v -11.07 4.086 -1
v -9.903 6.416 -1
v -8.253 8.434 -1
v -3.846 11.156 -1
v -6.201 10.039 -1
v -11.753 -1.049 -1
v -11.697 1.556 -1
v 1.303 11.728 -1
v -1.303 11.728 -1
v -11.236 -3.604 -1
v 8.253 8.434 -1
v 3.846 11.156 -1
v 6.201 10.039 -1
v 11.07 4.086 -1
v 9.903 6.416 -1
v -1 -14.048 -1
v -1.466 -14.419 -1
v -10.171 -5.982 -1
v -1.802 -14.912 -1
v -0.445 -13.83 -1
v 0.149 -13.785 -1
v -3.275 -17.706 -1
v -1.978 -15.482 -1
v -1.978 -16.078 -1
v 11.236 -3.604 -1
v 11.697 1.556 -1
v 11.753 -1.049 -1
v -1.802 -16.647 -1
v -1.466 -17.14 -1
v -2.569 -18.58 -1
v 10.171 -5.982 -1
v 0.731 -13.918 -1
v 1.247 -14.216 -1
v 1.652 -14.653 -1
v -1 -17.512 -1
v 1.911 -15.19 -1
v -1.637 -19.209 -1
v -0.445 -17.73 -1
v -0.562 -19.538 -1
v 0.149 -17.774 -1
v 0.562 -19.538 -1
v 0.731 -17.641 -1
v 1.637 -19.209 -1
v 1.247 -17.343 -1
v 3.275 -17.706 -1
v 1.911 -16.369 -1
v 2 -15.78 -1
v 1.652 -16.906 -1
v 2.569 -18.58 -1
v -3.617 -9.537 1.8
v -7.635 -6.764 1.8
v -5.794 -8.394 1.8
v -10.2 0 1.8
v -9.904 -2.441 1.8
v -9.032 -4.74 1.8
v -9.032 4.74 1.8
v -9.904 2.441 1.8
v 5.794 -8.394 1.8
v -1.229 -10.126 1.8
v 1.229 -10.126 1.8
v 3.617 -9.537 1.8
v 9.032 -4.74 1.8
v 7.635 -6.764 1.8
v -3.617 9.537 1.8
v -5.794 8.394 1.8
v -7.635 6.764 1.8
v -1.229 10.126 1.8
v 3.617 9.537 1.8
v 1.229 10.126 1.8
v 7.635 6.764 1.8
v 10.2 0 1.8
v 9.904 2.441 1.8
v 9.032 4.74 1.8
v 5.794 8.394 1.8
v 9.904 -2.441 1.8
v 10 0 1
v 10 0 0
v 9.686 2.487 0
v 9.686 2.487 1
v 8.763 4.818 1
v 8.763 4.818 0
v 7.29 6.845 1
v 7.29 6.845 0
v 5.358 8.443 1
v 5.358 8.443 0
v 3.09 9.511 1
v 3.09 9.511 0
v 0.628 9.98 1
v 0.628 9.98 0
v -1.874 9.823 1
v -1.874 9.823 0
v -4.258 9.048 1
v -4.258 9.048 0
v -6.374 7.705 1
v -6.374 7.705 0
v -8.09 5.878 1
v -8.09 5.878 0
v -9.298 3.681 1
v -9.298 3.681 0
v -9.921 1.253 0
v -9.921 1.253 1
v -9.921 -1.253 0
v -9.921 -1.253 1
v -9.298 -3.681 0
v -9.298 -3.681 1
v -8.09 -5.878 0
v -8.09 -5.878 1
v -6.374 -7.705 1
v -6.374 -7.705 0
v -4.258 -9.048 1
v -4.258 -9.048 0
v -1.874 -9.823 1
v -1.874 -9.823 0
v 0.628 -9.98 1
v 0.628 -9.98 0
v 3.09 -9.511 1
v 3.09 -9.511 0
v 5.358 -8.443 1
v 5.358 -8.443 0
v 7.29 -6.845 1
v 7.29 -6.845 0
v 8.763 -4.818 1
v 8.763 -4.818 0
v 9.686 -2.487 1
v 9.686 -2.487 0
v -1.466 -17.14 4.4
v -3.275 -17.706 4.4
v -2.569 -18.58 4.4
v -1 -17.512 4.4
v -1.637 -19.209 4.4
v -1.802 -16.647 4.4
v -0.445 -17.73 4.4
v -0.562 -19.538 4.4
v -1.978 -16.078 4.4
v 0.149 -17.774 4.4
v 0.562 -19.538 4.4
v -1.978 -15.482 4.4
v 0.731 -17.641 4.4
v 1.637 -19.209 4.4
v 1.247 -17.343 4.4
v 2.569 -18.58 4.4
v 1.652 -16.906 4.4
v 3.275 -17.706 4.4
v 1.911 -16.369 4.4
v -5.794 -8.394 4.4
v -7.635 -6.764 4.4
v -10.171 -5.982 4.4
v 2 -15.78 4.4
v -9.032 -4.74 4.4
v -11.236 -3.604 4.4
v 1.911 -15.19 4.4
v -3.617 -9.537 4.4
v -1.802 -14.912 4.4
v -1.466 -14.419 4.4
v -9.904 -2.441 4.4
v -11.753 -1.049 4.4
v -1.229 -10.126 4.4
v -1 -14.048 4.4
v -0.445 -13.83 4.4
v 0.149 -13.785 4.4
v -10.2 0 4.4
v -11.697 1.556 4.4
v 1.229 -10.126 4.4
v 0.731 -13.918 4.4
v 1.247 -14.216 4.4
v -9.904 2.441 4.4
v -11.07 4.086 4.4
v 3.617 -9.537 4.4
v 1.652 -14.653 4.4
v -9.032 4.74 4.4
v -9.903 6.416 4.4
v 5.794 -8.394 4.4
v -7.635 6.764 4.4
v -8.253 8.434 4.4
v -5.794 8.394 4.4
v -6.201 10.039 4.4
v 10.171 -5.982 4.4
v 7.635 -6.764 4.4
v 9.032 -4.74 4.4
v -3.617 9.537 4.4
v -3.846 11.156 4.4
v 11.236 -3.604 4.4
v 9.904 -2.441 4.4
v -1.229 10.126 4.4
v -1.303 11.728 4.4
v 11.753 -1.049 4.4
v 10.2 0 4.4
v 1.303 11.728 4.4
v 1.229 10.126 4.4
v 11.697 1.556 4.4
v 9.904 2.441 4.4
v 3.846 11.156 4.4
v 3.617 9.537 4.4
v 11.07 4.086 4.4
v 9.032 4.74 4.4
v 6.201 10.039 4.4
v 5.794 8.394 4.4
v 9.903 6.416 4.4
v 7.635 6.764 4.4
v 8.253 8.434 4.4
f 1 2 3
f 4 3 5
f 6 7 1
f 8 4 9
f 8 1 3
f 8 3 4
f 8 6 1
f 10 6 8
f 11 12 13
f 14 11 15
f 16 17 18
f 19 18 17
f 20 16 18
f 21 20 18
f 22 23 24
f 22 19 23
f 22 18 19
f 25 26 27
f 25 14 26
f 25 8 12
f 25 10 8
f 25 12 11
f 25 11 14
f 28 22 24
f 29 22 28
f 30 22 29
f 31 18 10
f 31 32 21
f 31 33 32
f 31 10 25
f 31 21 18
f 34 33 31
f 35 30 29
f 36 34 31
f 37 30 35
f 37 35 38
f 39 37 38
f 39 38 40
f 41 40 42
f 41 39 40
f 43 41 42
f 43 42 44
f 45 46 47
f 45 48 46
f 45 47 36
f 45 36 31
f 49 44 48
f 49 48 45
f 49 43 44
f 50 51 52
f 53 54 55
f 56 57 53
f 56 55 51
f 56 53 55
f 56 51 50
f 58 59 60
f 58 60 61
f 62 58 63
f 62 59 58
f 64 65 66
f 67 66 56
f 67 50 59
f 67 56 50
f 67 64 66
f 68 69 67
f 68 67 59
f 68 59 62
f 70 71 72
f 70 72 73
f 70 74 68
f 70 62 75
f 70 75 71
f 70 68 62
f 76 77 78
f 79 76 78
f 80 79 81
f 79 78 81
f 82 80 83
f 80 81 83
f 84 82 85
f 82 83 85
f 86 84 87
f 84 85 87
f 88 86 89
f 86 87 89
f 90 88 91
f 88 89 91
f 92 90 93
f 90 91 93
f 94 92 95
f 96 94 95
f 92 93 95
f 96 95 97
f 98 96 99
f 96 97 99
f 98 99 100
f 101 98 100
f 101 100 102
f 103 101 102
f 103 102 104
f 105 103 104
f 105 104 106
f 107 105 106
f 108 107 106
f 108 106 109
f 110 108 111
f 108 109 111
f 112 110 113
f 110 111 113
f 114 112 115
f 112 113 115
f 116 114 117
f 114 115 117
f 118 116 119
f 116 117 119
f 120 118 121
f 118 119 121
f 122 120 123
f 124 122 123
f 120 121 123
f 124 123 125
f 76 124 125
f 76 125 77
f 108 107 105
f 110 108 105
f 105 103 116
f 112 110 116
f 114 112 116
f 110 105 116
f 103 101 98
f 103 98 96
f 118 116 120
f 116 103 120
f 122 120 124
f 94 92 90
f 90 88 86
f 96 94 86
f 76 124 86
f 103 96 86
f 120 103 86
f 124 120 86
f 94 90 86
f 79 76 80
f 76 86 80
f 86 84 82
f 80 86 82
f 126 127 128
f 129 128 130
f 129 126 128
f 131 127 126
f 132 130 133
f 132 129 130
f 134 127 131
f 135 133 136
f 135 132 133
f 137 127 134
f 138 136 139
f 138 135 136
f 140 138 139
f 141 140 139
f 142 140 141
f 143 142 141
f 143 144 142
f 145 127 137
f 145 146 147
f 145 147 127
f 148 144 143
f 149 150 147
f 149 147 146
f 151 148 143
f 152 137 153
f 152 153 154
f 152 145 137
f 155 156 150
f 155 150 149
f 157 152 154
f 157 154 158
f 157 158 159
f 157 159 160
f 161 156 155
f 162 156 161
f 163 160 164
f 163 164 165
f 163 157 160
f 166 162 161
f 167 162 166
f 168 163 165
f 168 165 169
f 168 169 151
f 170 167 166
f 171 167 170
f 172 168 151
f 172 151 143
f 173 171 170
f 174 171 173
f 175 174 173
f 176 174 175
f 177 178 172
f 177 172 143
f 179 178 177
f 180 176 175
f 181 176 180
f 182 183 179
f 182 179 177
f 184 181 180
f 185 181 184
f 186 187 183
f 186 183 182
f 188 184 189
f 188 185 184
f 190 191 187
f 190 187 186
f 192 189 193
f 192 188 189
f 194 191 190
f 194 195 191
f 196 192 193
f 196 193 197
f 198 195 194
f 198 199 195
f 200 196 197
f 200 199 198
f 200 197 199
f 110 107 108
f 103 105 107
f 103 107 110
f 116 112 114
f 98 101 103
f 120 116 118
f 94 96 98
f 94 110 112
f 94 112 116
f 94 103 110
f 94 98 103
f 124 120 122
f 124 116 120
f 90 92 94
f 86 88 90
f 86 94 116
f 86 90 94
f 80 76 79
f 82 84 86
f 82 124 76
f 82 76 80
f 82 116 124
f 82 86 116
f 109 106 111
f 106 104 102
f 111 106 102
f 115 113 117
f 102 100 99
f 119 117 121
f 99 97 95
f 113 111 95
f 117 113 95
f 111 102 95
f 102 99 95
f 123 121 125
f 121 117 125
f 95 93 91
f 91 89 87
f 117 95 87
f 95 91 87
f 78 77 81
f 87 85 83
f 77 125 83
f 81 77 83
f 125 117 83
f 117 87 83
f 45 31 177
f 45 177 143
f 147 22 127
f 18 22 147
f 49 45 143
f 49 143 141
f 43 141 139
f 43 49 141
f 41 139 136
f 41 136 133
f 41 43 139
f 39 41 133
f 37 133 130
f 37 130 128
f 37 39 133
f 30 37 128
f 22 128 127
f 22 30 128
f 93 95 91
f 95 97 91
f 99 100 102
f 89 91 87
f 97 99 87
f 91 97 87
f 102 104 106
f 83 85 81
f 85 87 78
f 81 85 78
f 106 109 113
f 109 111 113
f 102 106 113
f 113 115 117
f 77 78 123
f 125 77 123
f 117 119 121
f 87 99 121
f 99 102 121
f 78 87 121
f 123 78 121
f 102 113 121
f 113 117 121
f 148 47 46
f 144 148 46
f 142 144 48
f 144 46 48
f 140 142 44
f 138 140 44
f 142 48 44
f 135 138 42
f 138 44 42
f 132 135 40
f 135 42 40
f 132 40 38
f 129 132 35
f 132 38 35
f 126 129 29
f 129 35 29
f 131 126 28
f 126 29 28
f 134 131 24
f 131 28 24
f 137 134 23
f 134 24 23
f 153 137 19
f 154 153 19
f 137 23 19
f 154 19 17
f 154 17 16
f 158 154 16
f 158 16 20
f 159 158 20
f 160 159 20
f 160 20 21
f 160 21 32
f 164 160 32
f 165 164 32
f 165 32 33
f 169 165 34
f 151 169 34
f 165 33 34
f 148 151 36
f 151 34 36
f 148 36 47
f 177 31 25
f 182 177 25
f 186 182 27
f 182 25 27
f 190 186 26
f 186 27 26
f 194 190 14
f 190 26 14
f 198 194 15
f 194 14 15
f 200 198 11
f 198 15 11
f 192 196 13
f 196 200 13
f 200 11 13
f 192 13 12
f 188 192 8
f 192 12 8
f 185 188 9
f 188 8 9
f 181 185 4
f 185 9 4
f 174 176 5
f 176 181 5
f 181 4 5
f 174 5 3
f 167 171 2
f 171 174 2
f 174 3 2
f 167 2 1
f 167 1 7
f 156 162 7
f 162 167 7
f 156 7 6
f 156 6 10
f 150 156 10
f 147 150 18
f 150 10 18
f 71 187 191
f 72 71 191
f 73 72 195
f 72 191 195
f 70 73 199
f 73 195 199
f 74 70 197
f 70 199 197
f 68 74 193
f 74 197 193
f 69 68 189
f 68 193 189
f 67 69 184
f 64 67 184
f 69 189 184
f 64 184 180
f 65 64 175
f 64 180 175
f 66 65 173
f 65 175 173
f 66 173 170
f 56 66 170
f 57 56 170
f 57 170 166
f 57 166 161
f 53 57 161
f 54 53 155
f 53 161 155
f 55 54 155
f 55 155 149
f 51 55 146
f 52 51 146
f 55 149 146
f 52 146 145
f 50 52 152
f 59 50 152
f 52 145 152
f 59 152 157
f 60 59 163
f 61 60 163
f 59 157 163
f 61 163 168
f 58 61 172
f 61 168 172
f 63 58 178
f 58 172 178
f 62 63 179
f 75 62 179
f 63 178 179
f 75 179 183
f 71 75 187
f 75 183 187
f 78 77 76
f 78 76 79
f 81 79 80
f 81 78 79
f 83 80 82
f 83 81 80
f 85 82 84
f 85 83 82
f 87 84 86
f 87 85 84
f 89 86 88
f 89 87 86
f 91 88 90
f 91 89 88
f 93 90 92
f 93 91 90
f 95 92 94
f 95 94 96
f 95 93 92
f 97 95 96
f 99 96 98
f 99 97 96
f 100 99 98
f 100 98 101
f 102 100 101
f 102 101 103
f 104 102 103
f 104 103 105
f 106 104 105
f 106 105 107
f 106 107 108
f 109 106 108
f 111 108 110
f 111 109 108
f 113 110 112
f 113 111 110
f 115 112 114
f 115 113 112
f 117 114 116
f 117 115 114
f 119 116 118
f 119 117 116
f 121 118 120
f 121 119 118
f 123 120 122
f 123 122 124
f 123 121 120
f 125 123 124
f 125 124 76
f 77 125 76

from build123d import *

# Parameters (mm, degrees)
F0_R      = 10
F1_DEPTH  = 1
F2_R      = 11.8
F3_DEPTH  = 1
F4_R      = 11.8
F4_R_2    = 10
F5_DEPTH  = 1
F6_R      = 11.8
F7_DEPTH  = 3.4
F8_R      = 10.2
F9_DEPTH  = 2.6
F10_R     = 2
F11_DEPTH = 5.4


with BuildPart() as f1:
    # F0 (on Top) → F1 (new body)
    with BuildSketch(Plane.XY):
        Circle(F0_R)
    extrude(amount=F1_DEPTH)


with BuildPart() as f3:
    # F2 (on face) → F3 (new body)
    with BuildSketch(Plane(origin=(0, 0, 0), x_dir=(1, 0, 0), z_dir=(0, 0, -1))):
        Circle(F2_R)
    extrude(amount=F3_DEPTH)

    # F4 (on face) → F5 (join)
    with BuildSketch(Plane.XY):
        Circle(F4_R)
        Circle(F4_R_2, mode=Mode.SUBTRACT)
    extrude(amount=F5_DEPTH)

    # F6 (on face) → F7 (join)
    with BuildSketch(Plane.XY.offset(1)):
        Circle(F6_R)
    extrude(amount=F7_DEPTH)

    # F8 (on face) → F9 (cut)
    with BuildSketch(Plane.XY.offset(4.4)):
        Circle(F8_R)
    extrude(amount=-F9_DEPTH, mode=Mode.SUBTRACT)

    # F10 (on face) → F11 (join, through all)
    with BuildSketch(Plane(origin=(0, 0, -1), x_dir=(1, 0, 0), z_dir=(0, 0, -1))):
        with BuildLine():
            ThreePointArc((-3.2754372895, 17.7062096148), (-0.9983331858, 12.113166694), (3.8, 15.7796815038))
            ThreePointArc((3.8, 15.7796815038), (3.6665148097, 16.7780146896), (3.2754372895, 17.7062096148))
            ThreePointArc((3.2754372895, 17.7062096148), (0, 19.5796815038), (-3.2754372895, 17.7062096148))
        make_face()
        with Locations((0, 15.7796815038)):
            Circle(F10_R, mode=Mode.SUBTRACT)
        with BuildLine():
            ThreePointArc((3.2754372895, 17.7062096148), (3.6665148097, 16.7780146896), (3.8, 15.7796815038))
            ThreePointArc((3.8, 15.7796815038), (-0.9983331858, 12.113166694), (-3.2754372895, 17.7062096148))
            Line((-3.2754372895, 17.7062096148), (-10.1710947411, 5.9823767658))
            ThreePointArc((-10.1710947411, 5.9823767658), (0, 11.8), (10.1710947411, 5.9823767658))
            Line((10.1710947411, 5.9823767658), (3.2754372895, 17.7062096148))
        make_face()
    extrude(amount=-F11_DEPTH)


solid = Compound([f1.part, f3.part])
